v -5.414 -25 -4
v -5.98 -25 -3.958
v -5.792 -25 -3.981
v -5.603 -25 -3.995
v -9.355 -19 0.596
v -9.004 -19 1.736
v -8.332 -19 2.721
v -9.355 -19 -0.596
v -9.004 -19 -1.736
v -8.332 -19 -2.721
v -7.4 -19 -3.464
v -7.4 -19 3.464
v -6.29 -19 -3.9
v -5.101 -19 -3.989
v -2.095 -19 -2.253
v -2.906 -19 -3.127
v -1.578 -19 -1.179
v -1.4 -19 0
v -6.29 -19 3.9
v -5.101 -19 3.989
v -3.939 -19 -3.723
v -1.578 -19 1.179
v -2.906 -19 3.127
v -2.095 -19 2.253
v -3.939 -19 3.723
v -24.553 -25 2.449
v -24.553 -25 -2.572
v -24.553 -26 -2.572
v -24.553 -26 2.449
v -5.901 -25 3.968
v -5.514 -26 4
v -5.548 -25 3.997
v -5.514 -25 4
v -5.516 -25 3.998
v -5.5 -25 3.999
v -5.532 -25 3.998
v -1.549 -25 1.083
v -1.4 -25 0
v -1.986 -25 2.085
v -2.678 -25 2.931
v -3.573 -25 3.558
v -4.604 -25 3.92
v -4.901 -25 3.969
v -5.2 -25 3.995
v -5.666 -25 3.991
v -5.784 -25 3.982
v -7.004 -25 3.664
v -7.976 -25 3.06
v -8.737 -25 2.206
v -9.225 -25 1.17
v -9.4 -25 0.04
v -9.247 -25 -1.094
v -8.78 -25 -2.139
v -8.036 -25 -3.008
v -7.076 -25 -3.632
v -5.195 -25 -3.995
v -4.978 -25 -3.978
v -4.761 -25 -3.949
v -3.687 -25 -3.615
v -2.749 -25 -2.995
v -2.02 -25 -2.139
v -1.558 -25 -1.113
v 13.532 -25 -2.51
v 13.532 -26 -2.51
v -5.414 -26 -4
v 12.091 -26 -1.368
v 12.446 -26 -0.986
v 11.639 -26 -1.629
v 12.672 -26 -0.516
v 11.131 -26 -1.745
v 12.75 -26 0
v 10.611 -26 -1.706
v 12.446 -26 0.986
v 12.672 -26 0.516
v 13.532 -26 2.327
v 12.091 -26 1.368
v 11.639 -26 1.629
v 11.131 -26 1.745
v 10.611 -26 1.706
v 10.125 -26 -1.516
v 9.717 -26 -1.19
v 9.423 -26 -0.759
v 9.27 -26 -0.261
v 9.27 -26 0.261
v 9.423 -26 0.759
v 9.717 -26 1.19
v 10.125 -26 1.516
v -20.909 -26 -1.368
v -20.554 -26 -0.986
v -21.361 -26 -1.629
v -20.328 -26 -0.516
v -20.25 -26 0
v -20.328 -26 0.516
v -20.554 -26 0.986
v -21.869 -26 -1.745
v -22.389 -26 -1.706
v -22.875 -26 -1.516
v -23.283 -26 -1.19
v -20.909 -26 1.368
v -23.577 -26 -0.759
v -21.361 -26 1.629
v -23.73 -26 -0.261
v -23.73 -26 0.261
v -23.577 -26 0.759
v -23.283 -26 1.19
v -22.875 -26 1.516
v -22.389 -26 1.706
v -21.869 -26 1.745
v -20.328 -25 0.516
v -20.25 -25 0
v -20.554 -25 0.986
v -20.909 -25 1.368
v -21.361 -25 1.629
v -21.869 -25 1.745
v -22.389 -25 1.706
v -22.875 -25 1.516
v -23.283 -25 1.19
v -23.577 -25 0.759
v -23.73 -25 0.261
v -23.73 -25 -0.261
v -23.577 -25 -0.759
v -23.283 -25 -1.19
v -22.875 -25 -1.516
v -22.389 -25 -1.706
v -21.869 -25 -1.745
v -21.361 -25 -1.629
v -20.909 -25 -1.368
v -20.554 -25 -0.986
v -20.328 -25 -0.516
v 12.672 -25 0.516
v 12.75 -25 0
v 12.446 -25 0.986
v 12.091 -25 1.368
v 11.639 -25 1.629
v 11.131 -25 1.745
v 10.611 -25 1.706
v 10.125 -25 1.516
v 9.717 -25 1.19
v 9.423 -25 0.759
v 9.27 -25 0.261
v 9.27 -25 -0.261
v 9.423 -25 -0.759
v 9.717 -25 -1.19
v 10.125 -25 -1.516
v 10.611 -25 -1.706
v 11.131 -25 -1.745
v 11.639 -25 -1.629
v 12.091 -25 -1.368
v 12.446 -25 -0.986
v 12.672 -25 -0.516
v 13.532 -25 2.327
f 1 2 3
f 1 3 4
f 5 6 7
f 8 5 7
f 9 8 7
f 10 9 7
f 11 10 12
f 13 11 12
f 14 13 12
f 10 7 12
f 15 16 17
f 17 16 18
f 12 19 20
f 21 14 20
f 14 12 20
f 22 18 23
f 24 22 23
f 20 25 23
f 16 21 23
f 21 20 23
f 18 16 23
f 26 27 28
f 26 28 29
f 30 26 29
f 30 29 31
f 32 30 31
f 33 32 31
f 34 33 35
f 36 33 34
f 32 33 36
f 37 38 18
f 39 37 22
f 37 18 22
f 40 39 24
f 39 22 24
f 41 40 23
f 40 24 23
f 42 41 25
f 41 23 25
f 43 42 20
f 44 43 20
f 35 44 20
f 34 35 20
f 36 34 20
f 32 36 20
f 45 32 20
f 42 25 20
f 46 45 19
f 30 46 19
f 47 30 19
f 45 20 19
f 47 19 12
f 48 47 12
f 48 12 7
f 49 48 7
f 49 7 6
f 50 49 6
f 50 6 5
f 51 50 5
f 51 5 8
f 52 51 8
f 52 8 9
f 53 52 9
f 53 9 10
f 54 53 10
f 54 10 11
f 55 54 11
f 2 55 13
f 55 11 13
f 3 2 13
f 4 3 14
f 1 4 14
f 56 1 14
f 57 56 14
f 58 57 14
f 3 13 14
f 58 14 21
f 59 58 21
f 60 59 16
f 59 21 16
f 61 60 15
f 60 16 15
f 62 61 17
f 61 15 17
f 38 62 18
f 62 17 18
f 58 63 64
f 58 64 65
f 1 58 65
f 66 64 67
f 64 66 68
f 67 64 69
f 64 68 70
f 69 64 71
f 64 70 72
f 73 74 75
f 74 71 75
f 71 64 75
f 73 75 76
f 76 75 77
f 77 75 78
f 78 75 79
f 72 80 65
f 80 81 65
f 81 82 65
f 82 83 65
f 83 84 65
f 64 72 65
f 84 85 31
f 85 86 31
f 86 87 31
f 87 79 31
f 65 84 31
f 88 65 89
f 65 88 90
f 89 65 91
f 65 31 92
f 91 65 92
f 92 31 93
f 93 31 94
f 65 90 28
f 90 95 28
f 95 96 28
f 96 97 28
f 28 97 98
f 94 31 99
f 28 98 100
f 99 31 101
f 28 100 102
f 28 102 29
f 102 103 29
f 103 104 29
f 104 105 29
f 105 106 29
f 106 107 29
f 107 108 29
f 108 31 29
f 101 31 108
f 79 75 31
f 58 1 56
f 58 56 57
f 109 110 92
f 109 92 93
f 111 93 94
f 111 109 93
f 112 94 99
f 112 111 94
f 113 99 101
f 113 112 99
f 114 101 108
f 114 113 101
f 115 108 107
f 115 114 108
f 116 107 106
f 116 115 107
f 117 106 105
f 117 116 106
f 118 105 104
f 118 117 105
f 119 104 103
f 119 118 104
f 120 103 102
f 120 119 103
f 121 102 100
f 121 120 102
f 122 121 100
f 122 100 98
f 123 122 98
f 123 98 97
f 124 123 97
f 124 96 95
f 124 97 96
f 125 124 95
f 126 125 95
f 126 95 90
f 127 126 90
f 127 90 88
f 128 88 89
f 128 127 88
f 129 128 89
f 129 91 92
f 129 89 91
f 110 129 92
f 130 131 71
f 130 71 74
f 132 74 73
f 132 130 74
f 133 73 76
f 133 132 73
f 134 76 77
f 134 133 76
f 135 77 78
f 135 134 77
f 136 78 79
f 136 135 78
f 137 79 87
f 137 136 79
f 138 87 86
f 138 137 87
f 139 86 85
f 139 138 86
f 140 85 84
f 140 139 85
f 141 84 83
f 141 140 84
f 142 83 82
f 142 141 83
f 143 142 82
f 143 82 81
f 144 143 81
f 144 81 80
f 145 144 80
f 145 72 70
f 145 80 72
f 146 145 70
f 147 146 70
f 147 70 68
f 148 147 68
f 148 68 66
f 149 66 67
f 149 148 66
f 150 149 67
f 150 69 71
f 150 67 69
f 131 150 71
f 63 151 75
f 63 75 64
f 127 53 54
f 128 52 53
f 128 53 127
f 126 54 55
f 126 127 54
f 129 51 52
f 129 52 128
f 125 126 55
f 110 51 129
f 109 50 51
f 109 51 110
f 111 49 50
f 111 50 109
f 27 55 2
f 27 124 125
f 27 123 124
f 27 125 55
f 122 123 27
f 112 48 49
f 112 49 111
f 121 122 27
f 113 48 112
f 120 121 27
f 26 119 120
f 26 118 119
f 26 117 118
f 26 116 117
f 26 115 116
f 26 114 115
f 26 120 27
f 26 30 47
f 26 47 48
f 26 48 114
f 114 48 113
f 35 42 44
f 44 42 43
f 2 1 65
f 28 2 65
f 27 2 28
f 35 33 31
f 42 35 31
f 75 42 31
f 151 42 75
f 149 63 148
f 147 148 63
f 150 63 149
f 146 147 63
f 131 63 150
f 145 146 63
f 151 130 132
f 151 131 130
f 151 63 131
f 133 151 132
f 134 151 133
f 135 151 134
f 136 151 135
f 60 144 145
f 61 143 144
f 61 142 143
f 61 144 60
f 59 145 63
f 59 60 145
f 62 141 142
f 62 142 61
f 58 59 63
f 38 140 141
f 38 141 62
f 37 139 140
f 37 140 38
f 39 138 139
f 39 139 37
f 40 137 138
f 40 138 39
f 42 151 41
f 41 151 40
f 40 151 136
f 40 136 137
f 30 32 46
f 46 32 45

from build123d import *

# Parameters (mm, degrees)
CYLINDER023_R          = 1.75
CYLINDER023_DEPTH      = 17
CYLINDER023_ROLL_ANGLE = 90
CYLINDER022_R          = 1.75
CYLINDER022_DEPTH      = 17
CYLINDER022_ROLL_ANGLE = 90
PAD009_DEPTH           = 1
CYLINDER009_R          = 4
CYLINDER009_DEPTH      = 6
CYLINDER009_ROLL_ANGLE = 90


with BuildPart() as cylinder023:
    # Cylinder023 → Cylinder023 (new body)
    with BuildSketch(Plane.XY):
        Circle(CYLINDER023_R)
    extrude(amount=CYLINDER023_DEPTH)


with BuildPart() as cylinder023_1:
    # Cylinder023 roll: moved
    add(cylinder023.part.rotate(Axis((0, 0, 0), (1, 0, 0)), CYLINDER023_ROLL_ANGLE))


with BuildPart() as cylinder023_2:
    # Cylinder023 placement: moved
    add(cylinder023_1.part.moved(Location((-22, -12, 0))))


with BuildPart() as fusion002:
    # Cylinder022 → Cylinder022 (new body)
    with BuildSketch(Plane.XY):
        Circle(CYLINDER022_R)
    extrude(amount=CYLINDER022_DEPTH)


with BuildPart() as fusion002_1:
    # Cylinder022 roll: moved
    add(fusion002.part.rotate(Axis((0, 0, 0), (1, 0, 0)), CYLINDER022_ROLL_ANGLE))


with BuildPart() as fusion002_2:
    # Cylinder022 placement: moved
    add(fusion002_1.part.moved(Location((11, -12, 0))))

    # Fusion002: union Cylinder023
    add(cylinder023_2.part)


with BuildPart() as cut007:
    # Sketch008 → Pad009 (new body)
    with BuildSketch(Plane.XZ.offset(25)):
        Polygon((-24.552685, 2.449149), (-5.514274, 4), (13.531528, 2.326694), (13.531528, -2.510369), (-5.414014, -4), (-24.552685, -2.571598), align=None)
    extrude(amount=PAD009_DEPTH)

    # Cut007: cut Fusion002
    add(fusion002_2.part, mode=Mode.SUBTRACT)


with BuildPart() as fusion003:
    # Cylinder009 → Cylinder009 (new body)
    with BuildSketch(Plane.XY):
        Circle(CYLINDER009_R)
    extrude(amount=CYLINDER009_DEPTH)


with BuildPart() as fusion003_1:
    # Cylinder009 roll: moved
    add(fusion003.part.rotate(Axis((0, 0, 0), (1, 0, 0)), CYLINDER009_ROLL_ANGLE))


with BuildPart() as fusion003_2:
    # Cylinder009 placement: moved
    add(fusion003_1.part.moved(Location((-5.4, -19, 0))))

    # Fusion003: union Cut007
    add(cut007.part)


solid = fusion003_2.part
